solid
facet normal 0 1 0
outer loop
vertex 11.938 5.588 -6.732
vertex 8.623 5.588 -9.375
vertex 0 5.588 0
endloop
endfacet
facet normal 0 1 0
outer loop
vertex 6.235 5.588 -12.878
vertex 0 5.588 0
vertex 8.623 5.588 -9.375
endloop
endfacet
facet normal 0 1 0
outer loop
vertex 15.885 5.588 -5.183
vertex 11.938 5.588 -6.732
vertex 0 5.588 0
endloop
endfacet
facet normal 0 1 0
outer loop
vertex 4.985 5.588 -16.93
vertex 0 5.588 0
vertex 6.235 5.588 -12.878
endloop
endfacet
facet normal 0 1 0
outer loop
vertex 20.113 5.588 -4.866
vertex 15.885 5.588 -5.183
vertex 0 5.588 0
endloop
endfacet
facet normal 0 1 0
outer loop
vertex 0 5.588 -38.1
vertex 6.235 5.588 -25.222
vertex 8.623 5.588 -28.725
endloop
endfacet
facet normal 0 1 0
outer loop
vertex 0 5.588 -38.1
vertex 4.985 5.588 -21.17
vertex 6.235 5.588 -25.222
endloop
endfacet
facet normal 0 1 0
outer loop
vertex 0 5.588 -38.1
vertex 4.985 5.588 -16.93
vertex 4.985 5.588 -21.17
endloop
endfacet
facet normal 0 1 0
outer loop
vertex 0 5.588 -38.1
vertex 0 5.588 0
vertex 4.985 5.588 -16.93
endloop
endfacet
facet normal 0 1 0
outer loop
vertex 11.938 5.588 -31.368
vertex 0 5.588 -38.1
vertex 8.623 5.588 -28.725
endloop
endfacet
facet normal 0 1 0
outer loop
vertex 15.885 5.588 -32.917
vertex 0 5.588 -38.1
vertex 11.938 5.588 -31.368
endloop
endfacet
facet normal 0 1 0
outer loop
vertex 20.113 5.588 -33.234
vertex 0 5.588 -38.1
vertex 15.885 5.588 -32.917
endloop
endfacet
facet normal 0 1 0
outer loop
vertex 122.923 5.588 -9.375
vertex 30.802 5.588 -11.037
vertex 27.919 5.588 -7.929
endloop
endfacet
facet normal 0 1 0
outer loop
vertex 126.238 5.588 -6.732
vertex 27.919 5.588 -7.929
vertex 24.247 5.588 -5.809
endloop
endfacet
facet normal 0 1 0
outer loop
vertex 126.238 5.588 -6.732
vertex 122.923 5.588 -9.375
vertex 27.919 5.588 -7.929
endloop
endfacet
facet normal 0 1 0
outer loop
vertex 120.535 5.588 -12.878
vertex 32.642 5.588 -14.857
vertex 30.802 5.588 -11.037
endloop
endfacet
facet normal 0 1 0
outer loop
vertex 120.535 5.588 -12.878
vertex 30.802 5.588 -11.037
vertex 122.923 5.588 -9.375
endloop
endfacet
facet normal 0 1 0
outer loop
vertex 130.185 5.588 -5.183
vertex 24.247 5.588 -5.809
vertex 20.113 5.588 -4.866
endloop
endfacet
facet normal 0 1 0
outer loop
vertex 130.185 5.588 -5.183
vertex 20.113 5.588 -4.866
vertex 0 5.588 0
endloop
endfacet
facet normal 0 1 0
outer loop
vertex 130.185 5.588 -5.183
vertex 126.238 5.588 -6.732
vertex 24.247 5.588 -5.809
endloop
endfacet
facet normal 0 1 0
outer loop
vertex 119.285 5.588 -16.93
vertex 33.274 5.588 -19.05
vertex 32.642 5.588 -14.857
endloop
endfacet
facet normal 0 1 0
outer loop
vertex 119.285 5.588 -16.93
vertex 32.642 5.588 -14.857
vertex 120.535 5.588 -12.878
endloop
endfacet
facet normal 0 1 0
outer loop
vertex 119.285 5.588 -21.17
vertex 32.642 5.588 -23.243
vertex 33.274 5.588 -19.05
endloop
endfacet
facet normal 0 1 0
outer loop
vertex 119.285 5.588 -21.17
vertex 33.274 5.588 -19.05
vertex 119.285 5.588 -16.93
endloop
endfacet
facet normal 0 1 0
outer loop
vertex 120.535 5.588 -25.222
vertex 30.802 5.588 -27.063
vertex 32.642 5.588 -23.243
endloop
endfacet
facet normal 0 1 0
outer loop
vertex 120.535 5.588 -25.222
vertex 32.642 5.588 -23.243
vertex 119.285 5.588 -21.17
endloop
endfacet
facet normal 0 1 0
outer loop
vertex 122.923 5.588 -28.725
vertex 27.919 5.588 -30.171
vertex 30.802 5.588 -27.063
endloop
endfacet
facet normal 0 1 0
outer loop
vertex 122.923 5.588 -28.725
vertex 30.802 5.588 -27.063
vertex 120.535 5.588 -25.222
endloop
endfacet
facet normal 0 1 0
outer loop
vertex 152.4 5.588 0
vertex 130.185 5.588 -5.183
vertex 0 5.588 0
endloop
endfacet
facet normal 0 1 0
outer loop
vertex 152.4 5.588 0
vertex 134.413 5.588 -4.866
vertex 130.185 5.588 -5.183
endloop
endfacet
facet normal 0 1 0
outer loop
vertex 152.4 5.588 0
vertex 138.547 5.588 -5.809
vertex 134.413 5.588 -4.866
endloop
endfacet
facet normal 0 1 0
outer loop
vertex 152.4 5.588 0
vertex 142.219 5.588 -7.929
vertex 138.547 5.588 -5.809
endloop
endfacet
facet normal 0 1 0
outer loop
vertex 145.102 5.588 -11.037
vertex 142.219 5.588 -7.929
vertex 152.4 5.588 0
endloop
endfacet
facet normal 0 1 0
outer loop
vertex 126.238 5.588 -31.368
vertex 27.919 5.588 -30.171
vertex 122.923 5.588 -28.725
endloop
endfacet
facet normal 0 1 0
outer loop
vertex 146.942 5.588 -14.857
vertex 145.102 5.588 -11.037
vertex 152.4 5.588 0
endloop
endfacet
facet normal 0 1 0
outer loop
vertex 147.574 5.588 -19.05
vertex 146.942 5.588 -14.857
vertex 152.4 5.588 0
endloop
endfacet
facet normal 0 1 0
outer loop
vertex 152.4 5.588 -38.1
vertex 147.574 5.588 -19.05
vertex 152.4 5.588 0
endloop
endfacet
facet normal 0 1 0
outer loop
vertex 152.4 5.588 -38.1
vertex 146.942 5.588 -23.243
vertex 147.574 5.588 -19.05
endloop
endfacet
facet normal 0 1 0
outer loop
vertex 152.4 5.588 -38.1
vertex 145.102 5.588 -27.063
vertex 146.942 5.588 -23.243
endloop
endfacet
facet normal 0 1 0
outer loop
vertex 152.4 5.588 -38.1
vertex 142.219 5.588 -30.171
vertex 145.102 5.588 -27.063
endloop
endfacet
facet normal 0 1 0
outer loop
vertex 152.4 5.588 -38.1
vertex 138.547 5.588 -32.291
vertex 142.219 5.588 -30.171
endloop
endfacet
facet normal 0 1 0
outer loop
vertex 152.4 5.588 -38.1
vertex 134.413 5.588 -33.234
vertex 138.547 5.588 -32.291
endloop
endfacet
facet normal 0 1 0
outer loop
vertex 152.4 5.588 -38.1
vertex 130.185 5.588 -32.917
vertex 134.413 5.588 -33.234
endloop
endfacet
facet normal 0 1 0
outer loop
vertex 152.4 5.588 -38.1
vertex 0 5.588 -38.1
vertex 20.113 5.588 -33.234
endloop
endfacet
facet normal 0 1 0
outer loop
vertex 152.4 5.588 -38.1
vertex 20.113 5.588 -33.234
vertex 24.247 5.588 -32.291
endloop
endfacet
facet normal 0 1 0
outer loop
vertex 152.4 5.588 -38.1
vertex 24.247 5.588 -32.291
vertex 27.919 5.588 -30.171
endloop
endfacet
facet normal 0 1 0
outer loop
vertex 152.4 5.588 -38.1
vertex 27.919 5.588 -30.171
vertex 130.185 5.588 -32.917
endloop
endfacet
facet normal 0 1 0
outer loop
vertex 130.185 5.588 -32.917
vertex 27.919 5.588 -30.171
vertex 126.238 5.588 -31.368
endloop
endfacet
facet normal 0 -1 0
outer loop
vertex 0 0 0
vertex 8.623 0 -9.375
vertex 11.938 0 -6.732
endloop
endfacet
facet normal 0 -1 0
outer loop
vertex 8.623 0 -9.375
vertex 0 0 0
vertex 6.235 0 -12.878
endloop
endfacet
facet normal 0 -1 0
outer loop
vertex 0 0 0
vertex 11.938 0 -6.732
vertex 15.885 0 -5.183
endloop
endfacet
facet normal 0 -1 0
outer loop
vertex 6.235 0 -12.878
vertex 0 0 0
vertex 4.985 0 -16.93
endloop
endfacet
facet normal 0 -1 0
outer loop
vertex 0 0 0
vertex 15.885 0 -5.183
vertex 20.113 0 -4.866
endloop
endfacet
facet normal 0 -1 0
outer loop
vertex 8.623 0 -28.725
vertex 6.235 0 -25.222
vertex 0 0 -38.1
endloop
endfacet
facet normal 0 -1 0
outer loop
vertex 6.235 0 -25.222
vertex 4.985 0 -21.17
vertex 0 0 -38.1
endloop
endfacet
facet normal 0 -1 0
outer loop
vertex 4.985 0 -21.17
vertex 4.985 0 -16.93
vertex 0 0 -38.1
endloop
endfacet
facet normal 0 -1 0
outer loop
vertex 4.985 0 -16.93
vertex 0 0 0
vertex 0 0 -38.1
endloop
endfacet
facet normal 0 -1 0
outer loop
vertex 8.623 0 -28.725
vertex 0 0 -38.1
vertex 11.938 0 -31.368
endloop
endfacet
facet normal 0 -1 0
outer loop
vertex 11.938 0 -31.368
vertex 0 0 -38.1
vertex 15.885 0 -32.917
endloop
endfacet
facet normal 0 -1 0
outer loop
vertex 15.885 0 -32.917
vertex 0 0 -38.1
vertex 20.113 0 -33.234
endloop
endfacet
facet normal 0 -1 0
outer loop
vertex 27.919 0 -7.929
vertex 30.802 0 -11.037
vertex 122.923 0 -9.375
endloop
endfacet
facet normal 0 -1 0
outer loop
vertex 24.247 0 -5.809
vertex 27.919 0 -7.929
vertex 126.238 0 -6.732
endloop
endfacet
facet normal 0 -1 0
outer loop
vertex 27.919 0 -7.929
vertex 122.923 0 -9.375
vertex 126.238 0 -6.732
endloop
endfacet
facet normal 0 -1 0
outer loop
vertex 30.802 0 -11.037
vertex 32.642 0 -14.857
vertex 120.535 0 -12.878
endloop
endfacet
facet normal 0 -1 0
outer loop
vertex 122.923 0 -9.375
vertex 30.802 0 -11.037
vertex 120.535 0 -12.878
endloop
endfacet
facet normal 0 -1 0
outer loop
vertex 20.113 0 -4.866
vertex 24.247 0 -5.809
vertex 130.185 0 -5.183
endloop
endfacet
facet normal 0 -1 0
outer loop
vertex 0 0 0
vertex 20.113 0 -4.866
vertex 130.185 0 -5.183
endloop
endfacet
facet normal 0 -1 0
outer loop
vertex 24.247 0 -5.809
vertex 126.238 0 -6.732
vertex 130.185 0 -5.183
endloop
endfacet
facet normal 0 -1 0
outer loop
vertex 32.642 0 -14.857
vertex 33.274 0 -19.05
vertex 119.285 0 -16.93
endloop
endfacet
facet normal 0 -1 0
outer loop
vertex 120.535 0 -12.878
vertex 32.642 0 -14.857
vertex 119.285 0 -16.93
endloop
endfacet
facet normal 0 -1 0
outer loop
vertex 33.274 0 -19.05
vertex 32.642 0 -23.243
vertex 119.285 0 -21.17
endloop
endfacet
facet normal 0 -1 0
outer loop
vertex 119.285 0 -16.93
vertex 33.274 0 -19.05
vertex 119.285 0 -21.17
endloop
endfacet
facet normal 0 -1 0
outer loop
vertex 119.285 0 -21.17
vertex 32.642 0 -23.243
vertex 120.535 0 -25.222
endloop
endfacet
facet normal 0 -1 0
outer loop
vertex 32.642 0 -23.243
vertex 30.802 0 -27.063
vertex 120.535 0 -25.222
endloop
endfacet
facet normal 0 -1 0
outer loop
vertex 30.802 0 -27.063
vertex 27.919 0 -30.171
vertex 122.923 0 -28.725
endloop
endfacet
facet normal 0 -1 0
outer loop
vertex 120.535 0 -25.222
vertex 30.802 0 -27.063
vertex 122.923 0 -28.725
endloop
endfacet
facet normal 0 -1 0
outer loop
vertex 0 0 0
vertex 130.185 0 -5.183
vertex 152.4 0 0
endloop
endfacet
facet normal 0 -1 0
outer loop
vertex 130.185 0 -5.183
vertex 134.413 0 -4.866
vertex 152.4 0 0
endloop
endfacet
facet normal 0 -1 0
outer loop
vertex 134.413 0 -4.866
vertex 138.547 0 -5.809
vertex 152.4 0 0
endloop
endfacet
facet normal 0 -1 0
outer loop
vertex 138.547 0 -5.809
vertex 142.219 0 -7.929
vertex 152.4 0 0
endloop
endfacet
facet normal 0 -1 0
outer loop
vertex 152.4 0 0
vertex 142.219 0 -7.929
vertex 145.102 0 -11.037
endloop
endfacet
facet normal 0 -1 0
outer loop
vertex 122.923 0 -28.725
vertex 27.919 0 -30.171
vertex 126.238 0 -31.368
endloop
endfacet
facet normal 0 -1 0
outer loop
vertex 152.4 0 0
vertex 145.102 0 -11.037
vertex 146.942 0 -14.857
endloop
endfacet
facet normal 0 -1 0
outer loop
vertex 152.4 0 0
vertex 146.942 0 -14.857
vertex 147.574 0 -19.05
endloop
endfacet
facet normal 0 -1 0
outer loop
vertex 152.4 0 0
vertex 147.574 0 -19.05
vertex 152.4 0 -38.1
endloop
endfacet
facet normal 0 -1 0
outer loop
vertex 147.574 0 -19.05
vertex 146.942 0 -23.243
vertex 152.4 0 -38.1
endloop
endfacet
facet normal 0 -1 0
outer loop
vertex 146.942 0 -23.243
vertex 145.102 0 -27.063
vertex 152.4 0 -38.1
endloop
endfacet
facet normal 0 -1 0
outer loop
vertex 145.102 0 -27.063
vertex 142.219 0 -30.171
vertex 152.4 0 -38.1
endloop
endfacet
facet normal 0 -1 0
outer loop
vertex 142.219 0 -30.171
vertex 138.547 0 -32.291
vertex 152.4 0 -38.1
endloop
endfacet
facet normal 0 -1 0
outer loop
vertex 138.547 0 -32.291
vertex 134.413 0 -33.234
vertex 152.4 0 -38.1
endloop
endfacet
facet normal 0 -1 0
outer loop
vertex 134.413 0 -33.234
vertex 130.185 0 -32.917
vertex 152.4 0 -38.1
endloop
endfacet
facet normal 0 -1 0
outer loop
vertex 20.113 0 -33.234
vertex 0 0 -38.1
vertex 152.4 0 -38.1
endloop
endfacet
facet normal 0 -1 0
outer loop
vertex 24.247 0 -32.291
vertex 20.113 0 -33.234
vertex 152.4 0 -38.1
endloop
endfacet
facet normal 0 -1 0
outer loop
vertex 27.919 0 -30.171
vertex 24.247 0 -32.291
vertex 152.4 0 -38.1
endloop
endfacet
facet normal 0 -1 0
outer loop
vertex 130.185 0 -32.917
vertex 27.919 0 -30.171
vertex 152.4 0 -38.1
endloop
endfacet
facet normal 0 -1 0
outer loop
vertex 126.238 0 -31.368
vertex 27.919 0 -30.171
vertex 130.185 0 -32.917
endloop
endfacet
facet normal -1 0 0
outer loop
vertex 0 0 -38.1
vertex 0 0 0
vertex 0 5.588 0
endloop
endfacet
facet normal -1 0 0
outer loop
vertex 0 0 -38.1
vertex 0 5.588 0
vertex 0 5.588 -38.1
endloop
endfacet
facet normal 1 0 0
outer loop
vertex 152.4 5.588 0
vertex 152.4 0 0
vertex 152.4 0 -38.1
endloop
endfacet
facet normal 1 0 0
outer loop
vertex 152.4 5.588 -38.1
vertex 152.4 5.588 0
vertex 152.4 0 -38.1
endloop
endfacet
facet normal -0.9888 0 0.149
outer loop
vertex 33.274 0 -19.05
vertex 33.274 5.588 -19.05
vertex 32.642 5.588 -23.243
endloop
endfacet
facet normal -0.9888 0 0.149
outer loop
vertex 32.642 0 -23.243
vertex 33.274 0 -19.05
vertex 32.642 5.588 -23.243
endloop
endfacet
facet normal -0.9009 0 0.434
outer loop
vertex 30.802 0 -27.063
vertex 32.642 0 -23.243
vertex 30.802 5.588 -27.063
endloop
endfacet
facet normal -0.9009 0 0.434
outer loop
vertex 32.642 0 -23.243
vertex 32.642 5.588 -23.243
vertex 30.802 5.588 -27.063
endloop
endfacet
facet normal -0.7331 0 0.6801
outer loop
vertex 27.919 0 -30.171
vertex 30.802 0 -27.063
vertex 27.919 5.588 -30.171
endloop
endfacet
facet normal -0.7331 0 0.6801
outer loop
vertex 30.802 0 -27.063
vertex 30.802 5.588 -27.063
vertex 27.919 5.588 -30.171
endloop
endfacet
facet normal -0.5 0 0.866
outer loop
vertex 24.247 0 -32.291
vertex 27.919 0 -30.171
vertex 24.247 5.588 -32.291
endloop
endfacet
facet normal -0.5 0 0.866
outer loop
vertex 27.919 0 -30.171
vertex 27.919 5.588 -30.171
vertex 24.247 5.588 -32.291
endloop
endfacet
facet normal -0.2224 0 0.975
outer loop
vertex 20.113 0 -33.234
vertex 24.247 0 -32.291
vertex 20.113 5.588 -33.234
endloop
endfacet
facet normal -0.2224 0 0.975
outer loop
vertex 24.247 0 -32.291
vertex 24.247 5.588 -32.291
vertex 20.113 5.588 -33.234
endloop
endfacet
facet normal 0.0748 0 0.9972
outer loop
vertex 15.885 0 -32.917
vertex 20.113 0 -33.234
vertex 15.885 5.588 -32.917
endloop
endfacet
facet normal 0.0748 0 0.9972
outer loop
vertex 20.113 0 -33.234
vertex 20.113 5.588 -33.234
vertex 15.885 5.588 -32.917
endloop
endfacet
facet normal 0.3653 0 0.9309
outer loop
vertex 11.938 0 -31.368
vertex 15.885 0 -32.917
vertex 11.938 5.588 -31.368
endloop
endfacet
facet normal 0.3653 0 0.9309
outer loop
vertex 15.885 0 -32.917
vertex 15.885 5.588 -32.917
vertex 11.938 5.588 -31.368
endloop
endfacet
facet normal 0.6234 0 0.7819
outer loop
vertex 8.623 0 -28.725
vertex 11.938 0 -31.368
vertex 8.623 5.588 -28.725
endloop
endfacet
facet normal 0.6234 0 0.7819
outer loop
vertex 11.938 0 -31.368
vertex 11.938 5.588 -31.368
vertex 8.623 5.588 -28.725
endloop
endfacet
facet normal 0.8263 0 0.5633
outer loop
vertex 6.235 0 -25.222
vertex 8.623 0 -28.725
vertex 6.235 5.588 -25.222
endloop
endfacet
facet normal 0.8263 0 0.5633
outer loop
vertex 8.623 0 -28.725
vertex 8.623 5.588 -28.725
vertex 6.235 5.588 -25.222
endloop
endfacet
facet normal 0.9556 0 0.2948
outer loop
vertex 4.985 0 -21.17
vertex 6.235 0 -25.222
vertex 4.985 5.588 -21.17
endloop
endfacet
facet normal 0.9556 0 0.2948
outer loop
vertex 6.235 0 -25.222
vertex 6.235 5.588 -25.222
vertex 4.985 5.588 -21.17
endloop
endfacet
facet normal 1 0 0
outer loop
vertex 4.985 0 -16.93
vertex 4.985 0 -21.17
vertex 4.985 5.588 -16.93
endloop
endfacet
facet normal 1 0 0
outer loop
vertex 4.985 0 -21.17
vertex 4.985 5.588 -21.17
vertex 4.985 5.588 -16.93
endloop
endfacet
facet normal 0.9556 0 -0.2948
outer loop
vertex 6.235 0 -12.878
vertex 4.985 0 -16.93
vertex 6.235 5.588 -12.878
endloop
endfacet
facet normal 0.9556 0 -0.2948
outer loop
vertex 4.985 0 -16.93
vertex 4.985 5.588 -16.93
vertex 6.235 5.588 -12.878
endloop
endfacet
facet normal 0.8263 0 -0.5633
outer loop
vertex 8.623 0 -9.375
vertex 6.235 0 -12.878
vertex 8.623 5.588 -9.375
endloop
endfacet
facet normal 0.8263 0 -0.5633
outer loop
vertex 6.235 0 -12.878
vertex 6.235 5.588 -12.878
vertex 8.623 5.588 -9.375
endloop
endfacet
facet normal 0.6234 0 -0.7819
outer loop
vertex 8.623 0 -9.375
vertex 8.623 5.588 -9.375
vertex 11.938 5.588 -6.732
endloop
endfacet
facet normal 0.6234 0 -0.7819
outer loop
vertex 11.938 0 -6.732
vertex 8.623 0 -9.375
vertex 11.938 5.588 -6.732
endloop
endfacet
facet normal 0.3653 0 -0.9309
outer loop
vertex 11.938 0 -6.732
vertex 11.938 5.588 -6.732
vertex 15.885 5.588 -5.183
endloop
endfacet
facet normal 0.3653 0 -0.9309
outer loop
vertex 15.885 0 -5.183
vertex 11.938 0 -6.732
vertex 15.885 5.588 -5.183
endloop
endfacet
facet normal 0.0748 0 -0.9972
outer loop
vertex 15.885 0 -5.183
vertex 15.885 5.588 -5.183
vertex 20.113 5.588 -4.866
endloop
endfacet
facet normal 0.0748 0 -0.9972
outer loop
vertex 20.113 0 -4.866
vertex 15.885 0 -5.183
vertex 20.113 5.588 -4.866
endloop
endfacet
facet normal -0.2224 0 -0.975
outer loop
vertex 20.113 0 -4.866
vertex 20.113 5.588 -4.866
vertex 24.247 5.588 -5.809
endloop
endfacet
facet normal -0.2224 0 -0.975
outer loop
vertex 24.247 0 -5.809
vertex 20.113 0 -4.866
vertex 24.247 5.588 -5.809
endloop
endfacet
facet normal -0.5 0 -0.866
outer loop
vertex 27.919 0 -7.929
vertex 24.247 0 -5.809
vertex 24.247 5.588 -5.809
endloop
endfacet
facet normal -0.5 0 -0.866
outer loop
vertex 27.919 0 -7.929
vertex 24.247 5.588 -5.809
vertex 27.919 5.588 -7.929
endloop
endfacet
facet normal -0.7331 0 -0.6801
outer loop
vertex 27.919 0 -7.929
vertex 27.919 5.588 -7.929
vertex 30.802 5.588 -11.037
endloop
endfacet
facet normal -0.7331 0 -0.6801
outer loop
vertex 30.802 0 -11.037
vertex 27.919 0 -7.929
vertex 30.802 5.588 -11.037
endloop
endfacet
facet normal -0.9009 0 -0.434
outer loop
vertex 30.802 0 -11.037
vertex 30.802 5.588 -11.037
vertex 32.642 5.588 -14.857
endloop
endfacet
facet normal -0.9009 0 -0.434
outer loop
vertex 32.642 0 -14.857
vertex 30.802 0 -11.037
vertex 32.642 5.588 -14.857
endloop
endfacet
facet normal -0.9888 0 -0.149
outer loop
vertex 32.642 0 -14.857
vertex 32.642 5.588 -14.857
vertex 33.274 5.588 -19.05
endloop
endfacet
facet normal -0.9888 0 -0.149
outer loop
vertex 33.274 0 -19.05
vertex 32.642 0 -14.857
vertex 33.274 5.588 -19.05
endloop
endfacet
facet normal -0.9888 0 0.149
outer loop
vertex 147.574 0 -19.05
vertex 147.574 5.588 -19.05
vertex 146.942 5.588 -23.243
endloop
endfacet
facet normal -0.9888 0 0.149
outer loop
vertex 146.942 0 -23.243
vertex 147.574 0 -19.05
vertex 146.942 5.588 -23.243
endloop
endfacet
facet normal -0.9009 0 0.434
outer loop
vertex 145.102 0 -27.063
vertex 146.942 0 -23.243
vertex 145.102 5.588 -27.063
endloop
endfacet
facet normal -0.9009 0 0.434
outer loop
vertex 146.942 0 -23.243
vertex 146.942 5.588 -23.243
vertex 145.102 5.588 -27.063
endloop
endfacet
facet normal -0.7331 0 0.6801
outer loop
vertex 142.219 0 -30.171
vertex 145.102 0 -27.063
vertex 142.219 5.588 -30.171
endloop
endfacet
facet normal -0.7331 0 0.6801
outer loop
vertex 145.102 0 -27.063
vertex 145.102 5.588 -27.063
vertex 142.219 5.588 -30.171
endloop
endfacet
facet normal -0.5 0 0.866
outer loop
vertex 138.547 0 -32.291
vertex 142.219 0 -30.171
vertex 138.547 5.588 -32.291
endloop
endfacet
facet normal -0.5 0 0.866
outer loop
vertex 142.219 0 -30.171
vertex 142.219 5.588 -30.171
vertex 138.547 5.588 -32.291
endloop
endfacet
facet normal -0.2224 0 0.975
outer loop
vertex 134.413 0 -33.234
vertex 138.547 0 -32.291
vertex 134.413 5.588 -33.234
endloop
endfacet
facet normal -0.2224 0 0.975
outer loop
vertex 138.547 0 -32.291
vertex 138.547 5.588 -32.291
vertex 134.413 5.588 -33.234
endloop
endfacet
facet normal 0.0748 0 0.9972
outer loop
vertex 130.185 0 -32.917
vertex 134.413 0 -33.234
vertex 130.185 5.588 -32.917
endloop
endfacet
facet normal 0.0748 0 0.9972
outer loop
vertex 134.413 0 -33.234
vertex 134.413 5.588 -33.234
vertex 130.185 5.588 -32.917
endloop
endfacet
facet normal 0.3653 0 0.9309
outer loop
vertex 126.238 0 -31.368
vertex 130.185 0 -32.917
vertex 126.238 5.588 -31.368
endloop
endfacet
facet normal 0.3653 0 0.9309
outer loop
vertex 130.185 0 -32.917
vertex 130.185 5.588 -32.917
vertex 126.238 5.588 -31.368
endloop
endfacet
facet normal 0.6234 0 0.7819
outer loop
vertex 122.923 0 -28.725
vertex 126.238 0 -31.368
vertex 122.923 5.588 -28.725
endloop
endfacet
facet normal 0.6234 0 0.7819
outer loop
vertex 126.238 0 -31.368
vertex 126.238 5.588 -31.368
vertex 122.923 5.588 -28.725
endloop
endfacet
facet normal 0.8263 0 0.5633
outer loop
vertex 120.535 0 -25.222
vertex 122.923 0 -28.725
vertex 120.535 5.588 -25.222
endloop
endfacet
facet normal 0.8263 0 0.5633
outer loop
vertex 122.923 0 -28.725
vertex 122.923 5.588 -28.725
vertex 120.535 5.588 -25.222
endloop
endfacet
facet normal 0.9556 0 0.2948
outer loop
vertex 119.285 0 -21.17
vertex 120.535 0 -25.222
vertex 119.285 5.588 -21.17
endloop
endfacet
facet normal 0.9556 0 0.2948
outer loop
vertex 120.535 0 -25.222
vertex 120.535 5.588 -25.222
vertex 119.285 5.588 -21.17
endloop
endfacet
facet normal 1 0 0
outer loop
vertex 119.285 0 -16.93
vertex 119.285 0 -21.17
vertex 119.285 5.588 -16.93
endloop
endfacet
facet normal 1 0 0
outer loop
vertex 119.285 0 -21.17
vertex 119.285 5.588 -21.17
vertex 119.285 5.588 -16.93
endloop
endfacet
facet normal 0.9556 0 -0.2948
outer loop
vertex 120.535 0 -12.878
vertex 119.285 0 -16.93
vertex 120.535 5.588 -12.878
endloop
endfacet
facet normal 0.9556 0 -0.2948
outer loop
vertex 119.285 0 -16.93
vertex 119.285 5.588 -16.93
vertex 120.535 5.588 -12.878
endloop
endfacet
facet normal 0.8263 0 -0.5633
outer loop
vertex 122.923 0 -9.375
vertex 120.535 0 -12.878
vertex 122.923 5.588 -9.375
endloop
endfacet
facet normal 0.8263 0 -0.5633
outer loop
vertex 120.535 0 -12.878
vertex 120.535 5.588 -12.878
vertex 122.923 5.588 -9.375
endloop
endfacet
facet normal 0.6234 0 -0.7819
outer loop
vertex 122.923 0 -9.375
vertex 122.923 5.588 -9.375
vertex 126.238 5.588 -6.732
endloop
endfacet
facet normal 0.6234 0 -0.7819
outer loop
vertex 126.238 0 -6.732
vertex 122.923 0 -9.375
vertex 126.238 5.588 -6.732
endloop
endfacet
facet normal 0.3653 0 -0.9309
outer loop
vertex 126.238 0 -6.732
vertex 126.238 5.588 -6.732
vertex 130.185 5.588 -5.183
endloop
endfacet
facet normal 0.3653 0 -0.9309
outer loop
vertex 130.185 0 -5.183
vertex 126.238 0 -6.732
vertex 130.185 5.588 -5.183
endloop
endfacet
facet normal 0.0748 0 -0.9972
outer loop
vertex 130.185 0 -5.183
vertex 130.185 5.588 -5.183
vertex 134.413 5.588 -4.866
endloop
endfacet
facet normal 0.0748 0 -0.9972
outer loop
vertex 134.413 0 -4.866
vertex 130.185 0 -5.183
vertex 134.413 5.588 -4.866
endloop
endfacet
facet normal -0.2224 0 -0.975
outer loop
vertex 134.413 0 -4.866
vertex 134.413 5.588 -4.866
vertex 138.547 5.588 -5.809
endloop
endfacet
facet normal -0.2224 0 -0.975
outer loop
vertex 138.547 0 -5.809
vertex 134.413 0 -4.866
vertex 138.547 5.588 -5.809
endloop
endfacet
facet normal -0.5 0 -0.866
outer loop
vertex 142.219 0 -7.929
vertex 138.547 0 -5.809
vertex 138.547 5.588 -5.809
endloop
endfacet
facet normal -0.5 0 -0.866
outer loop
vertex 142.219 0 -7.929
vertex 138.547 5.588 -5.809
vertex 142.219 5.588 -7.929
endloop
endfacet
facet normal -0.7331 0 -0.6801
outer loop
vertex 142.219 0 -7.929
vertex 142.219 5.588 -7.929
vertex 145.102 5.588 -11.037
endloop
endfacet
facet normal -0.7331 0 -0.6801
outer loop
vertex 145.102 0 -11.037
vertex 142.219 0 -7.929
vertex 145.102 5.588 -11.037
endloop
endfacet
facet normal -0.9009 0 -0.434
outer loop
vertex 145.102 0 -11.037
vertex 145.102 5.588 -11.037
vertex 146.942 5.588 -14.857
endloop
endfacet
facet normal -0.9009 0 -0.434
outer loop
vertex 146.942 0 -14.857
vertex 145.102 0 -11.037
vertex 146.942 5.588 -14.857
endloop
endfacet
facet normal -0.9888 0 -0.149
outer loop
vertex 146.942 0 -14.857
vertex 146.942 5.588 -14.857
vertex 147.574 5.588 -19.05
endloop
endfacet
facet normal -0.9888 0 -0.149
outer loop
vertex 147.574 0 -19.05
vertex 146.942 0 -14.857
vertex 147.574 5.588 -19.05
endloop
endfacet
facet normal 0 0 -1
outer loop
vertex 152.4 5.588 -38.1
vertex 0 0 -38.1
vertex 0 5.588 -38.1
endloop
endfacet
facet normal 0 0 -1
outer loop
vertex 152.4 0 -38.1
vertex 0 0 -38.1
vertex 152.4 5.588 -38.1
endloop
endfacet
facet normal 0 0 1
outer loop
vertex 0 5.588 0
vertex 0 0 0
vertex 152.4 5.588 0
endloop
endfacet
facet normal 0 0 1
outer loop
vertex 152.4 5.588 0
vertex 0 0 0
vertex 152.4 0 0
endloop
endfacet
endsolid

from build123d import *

# Parameters (mm, degrees)
SKETCH1_W           = 152.4
SKETCH1_H           = 38.1
BOSS_EXTRUDE1_DEPTH = 5.588
SKETCH6_R           = 14.224
CUT_EXTRUDE4_DEPTH  = 6.588
SKETCH7_R           = 14.224
CUT_EXTRUDE5_DEPTH  = 6.588


with BuildPart() as part:
    # Sketch1 → Boss-Extrude1 (new body)
    with BuildSketch(Plane(origin=(0, 0, 0), x_dir=(1, 0, 0), z_dir=(0, 1, 0))):
        with Locations((76.2, 19.05)):
            Rectangle(SKETCH1_W, SKETCH1_H)
    extrude(amount=BOSS_EXTRUDE1_DEPTH)

    # Sketch6 → Cut-Extrude4 (cut, through all)
    with BuildSketch(Plane(origin=(0, 5.588, 0), x_dir=(1, 0, 0), z_dir=(0, 1, 0))):
        with Locations((19.05, 19.05)):
            Circle(SKETCH6_R)
    extrude(amount=-CUT_EXTRUDE4_DEPTH, mode=Mode.SUBTRACT)

    # Sketch7 → Cut-Extrude5 (cut, through all)
    with BuildSketch(Plane(origin=(0, 5.588, 0), x_dir=(1, 0, 0), z_dir=(0, 1, 0))):
        with Locations((133.35, 19.05)):
            Circle(SKETCH7_R)
    extrude(amount=-CUT_EXTRUDE5_DEPTH, mode=Mode.SUBTRACT)


solid = part.part
